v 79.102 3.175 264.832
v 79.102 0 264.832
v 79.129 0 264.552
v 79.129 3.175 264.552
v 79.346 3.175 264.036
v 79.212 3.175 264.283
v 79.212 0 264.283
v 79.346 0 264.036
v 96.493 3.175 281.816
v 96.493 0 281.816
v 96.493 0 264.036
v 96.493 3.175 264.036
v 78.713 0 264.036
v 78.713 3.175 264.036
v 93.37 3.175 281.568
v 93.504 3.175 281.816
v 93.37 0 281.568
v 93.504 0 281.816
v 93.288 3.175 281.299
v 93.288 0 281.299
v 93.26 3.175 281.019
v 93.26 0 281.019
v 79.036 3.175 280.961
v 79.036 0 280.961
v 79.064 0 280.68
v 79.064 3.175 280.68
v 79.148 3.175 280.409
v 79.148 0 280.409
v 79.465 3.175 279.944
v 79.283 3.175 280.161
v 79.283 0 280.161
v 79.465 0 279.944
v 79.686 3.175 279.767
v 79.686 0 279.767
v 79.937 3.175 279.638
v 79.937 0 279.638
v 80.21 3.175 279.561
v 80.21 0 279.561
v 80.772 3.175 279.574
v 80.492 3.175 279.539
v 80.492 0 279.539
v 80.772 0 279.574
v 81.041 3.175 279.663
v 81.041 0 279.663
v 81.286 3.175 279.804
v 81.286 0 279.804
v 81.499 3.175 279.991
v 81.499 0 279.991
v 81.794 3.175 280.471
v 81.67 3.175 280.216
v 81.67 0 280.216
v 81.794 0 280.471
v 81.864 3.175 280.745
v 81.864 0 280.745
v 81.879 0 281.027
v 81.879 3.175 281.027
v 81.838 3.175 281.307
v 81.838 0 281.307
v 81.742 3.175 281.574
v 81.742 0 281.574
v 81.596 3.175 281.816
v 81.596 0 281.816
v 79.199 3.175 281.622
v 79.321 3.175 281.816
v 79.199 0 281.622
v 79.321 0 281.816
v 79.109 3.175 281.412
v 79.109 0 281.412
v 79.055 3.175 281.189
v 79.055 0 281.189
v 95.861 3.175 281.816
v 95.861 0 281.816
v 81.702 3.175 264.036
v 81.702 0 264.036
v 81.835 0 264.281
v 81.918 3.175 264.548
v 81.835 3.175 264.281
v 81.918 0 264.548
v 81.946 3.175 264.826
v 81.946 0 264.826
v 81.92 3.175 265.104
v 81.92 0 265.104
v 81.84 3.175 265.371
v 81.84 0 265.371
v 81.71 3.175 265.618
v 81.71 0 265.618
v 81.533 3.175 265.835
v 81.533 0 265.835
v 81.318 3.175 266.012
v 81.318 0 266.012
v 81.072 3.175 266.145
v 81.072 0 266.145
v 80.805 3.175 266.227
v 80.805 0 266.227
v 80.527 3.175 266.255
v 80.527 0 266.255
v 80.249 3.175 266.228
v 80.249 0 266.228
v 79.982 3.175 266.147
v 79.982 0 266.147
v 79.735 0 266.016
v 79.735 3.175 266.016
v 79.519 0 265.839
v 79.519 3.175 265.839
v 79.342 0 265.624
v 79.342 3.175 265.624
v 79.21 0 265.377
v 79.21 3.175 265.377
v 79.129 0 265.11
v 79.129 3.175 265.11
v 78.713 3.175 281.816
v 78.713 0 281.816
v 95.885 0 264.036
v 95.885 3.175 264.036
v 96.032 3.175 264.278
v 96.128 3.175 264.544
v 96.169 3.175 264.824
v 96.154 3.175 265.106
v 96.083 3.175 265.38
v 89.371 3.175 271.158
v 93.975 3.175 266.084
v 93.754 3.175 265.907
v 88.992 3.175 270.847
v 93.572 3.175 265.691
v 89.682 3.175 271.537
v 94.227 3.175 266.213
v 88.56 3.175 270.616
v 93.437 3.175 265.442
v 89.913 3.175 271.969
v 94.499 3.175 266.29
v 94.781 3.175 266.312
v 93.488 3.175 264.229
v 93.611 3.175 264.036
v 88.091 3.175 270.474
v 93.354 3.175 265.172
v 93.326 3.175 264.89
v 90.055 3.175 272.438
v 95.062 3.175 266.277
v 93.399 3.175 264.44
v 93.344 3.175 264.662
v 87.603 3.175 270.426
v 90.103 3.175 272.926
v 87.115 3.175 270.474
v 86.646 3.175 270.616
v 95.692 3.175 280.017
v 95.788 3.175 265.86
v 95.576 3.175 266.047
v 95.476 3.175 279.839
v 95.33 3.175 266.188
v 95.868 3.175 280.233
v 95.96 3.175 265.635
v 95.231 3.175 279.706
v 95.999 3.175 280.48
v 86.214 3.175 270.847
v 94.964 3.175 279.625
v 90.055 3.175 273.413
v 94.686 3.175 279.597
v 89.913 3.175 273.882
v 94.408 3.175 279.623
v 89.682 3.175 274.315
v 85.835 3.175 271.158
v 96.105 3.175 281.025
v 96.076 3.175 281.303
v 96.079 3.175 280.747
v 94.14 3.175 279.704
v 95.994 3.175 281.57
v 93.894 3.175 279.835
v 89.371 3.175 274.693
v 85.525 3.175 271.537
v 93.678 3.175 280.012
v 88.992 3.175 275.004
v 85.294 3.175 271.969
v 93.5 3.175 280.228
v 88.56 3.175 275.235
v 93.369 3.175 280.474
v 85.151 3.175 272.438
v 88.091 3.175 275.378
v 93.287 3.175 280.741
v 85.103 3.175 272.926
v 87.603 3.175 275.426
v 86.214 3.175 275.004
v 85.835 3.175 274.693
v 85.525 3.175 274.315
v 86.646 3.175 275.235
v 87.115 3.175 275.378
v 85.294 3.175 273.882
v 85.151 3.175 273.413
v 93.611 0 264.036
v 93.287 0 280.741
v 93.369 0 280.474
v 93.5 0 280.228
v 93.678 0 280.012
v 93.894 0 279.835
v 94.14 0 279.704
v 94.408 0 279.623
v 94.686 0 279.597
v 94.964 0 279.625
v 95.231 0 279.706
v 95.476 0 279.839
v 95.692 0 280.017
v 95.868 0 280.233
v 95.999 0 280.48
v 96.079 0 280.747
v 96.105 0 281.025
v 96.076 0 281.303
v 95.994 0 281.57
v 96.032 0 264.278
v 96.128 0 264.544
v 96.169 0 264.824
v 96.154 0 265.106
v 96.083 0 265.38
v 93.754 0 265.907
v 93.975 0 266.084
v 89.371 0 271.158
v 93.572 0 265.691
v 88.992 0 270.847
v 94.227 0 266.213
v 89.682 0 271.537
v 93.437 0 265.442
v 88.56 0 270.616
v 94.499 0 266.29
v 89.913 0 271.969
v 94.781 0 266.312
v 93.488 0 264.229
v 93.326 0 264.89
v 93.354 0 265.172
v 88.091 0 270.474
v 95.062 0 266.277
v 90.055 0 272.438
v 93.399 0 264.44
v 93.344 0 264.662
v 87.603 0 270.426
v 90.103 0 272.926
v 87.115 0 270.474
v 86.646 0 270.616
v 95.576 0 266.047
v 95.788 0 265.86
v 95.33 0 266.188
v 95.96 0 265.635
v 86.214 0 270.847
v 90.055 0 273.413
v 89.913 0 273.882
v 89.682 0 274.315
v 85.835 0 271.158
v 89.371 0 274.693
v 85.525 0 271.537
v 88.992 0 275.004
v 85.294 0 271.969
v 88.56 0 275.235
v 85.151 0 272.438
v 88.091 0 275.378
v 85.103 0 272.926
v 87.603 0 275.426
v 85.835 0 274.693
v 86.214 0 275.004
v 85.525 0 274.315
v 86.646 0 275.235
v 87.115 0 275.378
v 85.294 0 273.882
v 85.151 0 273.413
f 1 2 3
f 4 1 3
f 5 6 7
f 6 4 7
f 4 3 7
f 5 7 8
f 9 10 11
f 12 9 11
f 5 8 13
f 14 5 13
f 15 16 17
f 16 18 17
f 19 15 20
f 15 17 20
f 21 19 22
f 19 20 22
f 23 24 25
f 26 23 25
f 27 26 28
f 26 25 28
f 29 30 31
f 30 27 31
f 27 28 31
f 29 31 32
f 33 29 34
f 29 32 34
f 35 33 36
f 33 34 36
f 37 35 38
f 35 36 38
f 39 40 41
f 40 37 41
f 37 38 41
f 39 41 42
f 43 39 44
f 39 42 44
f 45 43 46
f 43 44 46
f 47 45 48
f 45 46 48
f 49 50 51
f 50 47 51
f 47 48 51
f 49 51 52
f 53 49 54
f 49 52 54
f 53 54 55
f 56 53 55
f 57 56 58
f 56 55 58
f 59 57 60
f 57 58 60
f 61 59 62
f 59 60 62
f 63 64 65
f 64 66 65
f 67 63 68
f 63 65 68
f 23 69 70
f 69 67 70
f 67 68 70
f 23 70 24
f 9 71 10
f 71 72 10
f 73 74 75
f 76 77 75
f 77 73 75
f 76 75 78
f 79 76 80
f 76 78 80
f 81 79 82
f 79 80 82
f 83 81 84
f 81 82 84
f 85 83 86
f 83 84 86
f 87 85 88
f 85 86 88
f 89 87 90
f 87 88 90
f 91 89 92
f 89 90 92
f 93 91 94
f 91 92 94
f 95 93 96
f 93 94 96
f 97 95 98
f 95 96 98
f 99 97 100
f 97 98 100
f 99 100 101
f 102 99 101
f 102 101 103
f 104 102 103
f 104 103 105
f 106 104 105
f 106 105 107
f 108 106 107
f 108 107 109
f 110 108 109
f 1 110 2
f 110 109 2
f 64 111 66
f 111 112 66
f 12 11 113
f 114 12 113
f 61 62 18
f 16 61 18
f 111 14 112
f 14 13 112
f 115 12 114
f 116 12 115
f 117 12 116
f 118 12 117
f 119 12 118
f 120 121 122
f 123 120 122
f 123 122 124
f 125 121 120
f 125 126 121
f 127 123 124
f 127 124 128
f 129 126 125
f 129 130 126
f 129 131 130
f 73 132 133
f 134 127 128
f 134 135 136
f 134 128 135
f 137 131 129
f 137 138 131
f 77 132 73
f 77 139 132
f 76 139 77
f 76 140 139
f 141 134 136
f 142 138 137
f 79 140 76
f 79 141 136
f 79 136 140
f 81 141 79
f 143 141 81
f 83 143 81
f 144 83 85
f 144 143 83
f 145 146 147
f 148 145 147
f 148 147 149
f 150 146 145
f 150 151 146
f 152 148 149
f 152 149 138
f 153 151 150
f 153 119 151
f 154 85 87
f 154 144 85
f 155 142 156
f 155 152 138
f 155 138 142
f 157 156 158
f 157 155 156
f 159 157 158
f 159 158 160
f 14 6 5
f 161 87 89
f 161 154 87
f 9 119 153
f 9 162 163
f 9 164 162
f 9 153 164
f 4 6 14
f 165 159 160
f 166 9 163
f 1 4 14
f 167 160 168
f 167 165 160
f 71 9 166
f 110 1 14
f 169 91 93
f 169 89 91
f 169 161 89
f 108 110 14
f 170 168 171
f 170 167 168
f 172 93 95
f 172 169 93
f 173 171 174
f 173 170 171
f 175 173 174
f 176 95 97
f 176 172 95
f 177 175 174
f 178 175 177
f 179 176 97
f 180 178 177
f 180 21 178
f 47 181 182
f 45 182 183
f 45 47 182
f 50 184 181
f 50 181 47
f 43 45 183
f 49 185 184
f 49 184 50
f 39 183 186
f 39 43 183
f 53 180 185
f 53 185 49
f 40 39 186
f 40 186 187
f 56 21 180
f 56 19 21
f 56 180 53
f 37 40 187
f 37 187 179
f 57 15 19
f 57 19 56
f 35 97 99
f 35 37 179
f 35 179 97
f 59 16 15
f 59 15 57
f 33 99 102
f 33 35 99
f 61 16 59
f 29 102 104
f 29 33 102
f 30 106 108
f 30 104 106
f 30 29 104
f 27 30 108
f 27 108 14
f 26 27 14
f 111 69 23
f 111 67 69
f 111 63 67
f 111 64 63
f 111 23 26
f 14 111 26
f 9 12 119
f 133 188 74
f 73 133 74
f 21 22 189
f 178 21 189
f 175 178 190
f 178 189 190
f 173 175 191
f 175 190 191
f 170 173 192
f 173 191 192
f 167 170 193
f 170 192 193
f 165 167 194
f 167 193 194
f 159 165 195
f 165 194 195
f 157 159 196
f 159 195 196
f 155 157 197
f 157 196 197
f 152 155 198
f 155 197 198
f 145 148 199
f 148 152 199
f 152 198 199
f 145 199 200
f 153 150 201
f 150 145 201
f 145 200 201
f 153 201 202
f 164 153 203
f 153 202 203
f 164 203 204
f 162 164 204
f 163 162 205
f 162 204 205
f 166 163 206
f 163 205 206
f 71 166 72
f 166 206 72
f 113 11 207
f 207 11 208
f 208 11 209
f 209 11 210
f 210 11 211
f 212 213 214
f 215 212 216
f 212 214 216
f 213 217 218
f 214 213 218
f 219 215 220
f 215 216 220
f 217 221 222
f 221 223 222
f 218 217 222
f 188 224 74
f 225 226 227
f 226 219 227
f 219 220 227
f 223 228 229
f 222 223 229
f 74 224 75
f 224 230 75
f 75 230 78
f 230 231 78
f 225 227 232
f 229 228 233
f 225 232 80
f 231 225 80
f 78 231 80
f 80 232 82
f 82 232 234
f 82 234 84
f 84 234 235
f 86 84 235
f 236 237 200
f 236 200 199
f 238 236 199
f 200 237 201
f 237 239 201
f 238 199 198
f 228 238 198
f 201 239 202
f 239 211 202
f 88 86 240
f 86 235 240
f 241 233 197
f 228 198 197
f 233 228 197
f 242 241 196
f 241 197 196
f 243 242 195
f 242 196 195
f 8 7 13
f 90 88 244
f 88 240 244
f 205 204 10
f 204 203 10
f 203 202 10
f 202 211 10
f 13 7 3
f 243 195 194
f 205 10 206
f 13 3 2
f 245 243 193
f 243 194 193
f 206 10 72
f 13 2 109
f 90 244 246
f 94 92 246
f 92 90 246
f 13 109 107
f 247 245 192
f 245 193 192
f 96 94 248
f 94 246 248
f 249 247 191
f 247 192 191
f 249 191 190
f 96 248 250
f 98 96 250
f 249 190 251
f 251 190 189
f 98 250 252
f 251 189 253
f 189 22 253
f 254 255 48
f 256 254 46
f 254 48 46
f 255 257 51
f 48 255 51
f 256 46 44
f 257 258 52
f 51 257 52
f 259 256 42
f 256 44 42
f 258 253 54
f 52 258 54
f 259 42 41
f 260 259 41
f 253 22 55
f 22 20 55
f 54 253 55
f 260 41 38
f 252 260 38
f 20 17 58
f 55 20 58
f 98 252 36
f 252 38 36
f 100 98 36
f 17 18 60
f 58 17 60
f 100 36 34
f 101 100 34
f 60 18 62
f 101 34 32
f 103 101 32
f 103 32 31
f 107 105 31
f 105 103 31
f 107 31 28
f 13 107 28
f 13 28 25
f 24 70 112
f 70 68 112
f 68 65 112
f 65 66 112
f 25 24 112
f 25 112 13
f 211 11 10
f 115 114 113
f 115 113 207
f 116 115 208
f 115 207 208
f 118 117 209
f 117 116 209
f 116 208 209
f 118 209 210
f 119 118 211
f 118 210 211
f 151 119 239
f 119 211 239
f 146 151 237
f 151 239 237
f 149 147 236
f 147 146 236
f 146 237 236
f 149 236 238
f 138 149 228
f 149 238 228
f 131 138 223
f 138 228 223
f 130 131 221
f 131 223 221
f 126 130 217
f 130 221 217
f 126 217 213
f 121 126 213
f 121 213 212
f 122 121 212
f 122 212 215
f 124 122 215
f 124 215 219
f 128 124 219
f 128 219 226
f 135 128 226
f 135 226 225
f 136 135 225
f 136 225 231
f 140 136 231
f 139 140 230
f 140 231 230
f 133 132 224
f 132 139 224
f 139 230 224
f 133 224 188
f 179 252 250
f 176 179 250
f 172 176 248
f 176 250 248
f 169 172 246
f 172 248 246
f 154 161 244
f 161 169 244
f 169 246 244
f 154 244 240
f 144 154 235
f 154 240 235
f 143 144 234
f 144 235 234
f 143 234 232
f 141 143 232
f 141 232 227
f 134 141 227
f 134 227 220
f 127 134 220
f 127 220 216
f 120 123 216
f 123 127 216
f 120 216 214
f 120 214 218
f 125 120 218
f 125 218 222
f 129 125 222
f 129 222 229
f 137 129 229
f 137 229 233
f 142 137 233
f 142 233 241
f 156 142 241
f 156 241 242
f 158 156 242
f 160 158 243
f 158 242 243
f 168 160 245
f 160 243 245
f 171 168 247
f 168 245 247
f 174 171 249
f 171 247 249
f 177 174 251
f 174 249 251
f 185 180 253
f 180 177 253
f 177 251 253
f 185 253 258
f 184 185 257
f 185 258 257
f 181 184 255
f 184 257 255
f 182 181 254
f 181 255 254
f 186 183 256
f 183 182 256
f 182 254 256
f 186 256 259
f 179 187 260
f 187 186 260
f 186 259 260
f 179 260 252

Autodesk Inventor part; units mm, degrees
ref_plane "YZ Plane" through (0, 0, 0) normal (1, 0, 0) x (0, 1, 0)
ref_plane "XZ Plane" through (0, 0, 0) normal (0, 1, 0) x (-1, 0, 0)
ref_plane "XY Plane" through (0, 0, 0) normal (0, 0, 1) x (1, 0, 0)
sketch "Sketch1" plane through (0, 0, 0) normal (0, 1, 0) x (-1, 0, 0)
  circle A0 centre (-94.6824, 281.0189) radius 1.4224
  circle A1 centre (-94.7479, 264.89) radius 1.4224
  circle A2 centre (-80.524, 264.8323) radius 1.4224
  circle A3 centre (-80.4585, 280.9611) radius 1.4224
  line L0 (-96.4532, 263.3256) -> (-77.4032, 263.3256) construction
  line L1 (-96.4532, 282.4506) -> (-96.4532, 263.4006) construction
  line L2 (-78.7132, 281.8156) -> (-96.4932, 281.8156)
  line L3 (-96.4932, 281.8156) -> (-96.4932, 264.0356)
  line L4 (-96.4932, 264.0356) -> (-78.7132, 264.0356)
  line L5 (-78.7132, 264.0356) -> (-78.7132, 281.8156)
  line L6 (-78.7132, 281.8156) -> (-96.4932, 264.0356) construction
  line L7 (-96.4932, 281.8156) -> (-78.7132, 264.0356) construction
  circle A4 centre (-87.6032, 272.9256) radius 2.5
  point P0 (0, 0)
extrude "Extrusion1" add sketch "Sketch1" along normal blind 3.175 contours A0 L2 A3 L5 L4 A2 A1 L3
